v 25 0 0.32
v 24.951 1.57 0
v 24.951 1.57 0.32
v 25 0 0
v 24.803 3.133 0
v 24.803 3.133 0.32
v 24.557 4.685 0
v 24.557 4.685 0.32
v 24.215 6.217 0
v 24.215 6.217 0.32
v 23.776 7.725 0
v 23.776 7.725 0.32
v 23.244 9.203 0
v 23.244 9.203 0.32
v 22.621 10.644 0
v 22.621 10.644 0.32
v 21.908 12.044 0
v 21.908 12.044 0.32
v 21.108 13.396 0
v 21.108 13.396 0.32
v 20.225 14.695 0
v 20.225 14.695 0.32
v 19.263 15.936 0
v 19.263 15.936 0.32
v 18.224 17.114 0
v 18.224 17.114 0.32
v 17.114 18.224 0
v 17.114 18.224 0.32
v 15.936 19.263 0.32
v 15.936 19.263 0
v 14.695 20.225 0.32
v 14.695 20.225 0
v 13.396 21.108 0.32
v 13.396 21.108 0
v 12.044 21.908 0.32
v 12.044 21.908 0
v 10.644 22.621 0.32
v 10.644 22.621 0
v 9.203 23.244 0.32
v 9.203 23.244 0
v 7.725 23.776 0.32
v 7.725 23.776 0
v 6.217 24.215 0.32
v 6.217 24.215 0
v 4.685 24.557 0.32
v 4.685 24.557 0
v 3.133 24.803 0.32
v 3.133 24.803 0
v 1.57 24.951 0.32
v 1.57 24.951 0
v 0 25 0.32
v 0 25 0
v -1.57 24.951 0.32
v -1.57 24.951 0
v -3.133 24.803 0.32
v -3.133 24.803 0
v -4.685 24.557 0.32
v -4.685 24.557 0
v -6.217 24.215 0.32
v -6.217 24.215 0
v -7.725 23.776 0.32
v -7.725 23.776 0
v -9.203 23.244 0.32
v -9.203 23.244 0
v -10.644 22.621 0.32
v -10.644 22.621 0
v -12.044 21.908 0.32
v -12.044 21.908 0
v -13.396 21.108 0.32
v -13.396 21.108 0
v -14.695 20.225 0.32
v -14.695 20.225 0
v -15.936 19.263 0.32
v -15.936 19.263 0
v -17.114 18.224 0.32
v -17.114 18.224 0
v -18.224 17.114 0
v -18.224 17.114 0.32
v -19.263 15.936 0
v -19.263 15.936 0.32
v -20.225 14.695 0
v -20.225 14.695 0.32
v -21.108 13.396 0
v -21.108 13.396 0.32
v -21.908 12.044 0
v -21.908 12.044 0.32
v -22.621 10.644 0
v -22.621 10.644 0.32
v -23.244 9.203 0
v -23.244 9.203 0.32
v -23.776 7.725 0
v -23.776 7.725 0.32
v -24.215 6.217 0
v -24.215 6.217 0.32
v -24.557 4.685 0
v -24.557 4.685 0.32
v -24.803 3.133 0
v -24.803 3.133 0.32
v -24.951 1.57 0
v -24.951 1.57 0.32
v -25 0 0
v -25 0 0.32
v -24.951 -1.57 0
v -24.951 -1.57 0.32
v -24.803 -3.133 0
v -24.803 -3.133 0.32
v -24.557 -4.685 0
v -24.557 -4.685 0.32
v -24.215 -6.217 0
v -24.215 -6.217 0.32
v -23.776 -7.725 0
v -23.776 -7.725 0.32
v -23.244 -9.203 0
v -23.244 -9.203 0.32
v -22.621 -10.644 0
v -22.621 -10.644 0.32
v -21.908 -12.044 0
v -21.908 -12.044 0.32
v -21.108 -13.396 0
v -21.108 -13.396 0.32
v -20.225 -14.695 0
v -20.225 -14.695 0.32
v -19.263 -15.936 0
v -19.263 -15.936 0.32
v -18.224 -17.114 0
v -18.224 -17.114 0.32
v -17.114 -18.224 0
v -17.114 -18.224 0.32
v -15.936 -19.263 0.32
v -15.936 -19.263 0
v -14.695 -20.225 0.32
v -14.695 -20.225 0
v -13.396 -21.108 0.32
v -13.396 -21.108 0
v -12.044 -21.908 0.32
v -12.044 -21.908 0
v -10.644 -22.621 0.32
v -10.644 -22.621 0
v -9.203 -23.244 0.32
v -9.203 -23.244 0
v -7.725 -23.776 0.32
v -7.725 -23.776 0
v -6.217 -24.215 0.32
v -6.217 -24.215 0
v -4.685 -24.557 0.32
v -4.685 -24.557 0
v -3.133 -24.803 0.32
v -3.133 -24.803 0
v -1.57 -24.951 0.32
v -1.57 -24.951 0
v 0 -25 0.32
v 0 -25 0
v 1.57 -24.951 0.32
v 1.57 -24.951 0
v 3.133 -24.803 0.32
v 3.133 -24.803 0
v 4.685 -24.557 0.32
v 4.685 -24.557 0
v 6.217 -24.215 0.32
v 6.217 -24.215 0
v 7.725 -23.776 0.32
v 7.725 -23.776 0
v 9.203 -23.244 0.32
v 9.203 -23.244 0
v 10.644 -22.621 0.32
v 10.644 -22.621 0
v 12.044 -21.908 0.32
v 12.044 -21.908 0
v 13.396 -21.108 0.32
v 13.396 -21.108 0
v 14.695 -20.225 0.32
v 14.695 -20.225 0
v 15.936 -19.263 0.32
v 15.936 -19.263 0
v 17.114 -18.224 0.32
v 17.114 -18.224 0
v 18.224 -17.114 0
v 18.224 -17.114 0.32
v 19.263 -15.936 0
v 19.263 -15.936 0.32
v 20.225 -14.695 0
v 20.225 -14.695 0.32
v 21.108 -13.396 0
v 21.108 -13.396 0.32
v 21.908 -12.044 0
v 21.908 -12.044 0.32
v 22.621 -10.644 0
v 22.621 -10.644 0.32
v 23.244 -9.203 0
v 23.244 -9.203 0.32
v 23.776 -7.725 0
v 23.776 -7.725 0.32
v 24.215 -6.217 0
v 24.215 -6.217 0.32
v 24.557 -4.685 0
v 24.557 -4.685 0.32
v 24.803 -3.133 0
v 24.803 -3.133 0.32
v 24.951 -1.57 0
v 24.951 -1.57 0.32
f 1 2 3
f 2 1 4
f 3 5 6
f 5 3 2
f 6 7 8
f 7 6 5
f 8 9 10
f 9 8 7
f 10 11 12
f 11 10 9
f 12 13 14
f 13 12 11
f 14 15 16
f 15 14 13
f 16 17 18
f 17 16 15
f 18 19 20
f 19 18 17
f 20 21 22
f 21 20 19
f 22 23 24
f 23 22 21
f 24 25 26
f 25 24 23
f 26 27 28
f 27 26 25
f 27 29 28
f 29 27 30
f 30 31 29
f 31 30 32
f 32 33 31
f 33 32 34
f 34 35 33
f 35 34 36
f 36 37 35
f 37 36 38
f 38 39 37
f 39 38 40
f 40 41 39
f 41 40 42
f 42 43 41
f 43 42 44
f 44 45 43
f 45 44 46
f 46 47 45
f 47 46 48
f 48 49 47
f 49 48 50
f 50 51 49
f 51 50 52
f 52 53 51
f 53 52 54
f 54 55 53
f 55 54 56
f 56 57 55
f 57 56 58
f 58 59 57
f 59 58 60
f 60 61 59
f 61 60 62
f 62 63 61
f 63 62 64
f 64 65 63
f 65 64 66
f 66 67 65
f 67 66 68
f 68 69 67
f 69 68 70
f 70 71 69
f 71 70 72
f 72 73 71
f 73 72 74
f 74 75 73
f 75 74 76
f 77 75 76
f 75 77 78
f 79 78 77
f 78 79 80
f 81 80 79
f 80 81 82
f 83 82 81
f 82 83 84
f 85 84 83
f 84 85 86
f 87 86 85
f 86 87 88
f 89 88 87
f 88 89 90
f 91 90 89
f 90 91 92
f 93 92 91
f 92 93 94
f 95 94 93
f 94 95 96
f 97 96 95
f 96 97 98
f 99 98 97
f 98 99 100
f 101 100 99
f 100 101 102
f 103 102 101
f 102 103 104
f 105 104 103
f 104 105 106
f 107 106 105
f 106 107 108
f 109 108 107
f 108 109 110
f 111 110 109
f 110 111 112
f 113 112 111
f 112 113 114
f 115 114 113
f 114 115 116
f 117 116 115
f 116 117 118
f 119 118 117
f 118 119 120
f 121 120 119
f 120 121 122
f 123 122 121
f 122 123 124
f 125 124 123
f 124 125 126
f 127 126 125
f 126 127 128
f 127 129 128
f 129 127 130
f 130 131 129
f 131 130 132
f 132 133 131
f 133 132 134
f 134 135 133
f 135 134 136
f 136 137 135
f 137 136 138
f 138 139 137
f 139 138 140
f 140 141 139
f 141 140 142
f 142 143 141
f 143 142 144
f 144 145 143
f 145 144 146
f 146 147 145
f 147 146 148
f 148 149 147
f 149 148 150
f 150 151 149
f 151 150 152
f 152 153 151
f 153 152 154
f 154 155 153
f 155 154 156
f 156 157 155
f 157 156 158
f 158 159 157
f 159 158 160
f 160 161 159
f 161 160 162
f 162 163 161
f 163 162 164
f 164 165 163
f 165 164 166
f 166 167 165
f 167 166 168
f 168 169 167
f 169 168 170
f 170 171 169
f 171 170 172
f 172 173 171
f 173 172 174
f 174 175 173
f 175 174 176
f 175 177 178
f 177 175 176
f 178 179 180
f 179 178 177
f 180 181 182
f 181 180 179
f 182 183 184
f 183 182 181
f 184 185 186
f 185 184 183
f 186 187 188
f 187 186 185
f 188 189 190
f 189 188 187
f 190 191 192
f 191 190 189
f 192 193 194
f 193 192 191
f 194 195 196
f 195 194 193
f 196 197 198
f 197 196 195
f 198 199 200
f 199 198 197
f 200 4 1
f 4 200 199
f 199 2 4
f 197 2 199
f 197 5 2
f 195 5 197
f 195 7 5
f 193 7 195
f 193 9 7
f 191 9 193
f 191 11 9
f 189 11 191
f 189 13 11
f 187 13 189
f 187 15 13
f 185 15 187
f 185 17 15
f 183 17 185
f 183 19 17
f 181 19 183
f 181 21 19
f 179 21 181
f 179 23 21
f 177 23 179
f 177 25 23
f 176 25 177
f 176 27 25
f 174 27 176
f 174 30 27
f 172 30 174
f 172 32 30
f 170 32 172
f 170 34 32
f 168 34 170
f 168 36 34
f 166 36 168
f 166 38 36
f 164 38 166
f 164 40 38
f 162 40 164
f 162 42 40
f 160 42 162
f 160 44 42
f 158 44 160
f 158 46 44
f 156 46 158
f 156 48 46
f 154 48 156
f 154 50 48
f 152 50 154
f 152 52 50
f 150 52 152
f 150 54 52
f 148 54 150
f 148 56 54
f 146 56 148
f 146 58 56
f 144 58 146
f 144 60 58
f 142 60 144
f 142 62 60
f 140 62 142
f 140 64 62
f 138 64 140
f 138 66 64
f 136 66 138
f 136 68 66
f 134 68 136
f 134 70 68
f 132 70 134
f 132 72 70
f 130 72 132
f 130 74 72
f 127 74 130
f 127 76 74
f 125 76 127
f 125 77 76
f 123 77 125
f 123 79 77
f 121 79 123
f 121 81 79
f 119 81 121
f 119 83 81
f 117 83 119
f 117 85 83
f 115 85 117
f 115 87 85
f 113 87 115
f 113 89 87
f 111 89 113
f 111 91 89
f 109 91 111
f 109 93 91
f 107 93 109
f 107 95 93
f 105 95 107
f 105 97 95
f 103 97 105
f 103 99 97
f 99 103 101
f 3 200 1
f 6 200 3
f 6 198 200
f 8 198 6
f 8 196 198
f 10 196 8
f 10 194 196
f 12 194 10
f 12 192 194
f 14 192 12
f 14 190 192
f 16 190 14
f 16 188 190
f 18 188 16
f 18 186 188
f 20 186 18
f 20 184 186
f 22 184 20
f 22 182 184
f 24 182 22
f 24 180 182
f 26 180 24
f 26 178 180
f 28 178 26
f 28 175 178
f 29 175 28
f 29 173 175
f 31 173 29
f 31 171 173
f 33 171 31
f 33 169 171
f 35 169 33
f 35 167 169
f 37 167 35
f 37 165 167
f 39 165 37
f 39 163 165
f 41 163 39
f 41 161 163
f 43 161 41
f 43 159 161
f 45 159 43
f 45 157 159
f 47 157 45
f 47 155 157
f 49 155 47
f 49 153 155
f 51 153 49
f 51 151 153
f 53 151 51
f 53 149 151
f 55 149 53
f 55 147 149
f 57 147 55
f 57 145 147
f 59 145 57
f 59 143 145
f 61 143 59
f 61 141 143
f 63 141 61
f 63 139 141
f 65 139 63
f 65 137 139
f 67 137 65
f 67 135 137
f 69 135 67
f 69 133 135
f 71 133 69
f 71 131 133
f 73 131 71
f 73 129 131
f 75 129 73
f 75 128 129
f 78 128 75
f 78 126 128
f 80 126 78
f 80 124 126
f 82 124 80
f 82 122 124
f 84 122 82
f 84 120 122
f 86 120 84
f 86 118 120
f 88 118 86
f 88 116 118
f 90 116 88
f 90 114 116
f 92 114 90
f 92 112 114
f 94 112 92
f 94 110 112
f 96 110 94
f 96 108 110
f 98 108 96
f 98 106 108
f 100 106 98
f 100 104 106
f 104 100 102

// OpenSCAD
first_layer_height = 0.24;
layer_height = 0.08;

edge = 50;

cylinder(
    r = edge/2,
    h = first_layer_height+ layer_height,
    center = false,
    $fn = 100);
